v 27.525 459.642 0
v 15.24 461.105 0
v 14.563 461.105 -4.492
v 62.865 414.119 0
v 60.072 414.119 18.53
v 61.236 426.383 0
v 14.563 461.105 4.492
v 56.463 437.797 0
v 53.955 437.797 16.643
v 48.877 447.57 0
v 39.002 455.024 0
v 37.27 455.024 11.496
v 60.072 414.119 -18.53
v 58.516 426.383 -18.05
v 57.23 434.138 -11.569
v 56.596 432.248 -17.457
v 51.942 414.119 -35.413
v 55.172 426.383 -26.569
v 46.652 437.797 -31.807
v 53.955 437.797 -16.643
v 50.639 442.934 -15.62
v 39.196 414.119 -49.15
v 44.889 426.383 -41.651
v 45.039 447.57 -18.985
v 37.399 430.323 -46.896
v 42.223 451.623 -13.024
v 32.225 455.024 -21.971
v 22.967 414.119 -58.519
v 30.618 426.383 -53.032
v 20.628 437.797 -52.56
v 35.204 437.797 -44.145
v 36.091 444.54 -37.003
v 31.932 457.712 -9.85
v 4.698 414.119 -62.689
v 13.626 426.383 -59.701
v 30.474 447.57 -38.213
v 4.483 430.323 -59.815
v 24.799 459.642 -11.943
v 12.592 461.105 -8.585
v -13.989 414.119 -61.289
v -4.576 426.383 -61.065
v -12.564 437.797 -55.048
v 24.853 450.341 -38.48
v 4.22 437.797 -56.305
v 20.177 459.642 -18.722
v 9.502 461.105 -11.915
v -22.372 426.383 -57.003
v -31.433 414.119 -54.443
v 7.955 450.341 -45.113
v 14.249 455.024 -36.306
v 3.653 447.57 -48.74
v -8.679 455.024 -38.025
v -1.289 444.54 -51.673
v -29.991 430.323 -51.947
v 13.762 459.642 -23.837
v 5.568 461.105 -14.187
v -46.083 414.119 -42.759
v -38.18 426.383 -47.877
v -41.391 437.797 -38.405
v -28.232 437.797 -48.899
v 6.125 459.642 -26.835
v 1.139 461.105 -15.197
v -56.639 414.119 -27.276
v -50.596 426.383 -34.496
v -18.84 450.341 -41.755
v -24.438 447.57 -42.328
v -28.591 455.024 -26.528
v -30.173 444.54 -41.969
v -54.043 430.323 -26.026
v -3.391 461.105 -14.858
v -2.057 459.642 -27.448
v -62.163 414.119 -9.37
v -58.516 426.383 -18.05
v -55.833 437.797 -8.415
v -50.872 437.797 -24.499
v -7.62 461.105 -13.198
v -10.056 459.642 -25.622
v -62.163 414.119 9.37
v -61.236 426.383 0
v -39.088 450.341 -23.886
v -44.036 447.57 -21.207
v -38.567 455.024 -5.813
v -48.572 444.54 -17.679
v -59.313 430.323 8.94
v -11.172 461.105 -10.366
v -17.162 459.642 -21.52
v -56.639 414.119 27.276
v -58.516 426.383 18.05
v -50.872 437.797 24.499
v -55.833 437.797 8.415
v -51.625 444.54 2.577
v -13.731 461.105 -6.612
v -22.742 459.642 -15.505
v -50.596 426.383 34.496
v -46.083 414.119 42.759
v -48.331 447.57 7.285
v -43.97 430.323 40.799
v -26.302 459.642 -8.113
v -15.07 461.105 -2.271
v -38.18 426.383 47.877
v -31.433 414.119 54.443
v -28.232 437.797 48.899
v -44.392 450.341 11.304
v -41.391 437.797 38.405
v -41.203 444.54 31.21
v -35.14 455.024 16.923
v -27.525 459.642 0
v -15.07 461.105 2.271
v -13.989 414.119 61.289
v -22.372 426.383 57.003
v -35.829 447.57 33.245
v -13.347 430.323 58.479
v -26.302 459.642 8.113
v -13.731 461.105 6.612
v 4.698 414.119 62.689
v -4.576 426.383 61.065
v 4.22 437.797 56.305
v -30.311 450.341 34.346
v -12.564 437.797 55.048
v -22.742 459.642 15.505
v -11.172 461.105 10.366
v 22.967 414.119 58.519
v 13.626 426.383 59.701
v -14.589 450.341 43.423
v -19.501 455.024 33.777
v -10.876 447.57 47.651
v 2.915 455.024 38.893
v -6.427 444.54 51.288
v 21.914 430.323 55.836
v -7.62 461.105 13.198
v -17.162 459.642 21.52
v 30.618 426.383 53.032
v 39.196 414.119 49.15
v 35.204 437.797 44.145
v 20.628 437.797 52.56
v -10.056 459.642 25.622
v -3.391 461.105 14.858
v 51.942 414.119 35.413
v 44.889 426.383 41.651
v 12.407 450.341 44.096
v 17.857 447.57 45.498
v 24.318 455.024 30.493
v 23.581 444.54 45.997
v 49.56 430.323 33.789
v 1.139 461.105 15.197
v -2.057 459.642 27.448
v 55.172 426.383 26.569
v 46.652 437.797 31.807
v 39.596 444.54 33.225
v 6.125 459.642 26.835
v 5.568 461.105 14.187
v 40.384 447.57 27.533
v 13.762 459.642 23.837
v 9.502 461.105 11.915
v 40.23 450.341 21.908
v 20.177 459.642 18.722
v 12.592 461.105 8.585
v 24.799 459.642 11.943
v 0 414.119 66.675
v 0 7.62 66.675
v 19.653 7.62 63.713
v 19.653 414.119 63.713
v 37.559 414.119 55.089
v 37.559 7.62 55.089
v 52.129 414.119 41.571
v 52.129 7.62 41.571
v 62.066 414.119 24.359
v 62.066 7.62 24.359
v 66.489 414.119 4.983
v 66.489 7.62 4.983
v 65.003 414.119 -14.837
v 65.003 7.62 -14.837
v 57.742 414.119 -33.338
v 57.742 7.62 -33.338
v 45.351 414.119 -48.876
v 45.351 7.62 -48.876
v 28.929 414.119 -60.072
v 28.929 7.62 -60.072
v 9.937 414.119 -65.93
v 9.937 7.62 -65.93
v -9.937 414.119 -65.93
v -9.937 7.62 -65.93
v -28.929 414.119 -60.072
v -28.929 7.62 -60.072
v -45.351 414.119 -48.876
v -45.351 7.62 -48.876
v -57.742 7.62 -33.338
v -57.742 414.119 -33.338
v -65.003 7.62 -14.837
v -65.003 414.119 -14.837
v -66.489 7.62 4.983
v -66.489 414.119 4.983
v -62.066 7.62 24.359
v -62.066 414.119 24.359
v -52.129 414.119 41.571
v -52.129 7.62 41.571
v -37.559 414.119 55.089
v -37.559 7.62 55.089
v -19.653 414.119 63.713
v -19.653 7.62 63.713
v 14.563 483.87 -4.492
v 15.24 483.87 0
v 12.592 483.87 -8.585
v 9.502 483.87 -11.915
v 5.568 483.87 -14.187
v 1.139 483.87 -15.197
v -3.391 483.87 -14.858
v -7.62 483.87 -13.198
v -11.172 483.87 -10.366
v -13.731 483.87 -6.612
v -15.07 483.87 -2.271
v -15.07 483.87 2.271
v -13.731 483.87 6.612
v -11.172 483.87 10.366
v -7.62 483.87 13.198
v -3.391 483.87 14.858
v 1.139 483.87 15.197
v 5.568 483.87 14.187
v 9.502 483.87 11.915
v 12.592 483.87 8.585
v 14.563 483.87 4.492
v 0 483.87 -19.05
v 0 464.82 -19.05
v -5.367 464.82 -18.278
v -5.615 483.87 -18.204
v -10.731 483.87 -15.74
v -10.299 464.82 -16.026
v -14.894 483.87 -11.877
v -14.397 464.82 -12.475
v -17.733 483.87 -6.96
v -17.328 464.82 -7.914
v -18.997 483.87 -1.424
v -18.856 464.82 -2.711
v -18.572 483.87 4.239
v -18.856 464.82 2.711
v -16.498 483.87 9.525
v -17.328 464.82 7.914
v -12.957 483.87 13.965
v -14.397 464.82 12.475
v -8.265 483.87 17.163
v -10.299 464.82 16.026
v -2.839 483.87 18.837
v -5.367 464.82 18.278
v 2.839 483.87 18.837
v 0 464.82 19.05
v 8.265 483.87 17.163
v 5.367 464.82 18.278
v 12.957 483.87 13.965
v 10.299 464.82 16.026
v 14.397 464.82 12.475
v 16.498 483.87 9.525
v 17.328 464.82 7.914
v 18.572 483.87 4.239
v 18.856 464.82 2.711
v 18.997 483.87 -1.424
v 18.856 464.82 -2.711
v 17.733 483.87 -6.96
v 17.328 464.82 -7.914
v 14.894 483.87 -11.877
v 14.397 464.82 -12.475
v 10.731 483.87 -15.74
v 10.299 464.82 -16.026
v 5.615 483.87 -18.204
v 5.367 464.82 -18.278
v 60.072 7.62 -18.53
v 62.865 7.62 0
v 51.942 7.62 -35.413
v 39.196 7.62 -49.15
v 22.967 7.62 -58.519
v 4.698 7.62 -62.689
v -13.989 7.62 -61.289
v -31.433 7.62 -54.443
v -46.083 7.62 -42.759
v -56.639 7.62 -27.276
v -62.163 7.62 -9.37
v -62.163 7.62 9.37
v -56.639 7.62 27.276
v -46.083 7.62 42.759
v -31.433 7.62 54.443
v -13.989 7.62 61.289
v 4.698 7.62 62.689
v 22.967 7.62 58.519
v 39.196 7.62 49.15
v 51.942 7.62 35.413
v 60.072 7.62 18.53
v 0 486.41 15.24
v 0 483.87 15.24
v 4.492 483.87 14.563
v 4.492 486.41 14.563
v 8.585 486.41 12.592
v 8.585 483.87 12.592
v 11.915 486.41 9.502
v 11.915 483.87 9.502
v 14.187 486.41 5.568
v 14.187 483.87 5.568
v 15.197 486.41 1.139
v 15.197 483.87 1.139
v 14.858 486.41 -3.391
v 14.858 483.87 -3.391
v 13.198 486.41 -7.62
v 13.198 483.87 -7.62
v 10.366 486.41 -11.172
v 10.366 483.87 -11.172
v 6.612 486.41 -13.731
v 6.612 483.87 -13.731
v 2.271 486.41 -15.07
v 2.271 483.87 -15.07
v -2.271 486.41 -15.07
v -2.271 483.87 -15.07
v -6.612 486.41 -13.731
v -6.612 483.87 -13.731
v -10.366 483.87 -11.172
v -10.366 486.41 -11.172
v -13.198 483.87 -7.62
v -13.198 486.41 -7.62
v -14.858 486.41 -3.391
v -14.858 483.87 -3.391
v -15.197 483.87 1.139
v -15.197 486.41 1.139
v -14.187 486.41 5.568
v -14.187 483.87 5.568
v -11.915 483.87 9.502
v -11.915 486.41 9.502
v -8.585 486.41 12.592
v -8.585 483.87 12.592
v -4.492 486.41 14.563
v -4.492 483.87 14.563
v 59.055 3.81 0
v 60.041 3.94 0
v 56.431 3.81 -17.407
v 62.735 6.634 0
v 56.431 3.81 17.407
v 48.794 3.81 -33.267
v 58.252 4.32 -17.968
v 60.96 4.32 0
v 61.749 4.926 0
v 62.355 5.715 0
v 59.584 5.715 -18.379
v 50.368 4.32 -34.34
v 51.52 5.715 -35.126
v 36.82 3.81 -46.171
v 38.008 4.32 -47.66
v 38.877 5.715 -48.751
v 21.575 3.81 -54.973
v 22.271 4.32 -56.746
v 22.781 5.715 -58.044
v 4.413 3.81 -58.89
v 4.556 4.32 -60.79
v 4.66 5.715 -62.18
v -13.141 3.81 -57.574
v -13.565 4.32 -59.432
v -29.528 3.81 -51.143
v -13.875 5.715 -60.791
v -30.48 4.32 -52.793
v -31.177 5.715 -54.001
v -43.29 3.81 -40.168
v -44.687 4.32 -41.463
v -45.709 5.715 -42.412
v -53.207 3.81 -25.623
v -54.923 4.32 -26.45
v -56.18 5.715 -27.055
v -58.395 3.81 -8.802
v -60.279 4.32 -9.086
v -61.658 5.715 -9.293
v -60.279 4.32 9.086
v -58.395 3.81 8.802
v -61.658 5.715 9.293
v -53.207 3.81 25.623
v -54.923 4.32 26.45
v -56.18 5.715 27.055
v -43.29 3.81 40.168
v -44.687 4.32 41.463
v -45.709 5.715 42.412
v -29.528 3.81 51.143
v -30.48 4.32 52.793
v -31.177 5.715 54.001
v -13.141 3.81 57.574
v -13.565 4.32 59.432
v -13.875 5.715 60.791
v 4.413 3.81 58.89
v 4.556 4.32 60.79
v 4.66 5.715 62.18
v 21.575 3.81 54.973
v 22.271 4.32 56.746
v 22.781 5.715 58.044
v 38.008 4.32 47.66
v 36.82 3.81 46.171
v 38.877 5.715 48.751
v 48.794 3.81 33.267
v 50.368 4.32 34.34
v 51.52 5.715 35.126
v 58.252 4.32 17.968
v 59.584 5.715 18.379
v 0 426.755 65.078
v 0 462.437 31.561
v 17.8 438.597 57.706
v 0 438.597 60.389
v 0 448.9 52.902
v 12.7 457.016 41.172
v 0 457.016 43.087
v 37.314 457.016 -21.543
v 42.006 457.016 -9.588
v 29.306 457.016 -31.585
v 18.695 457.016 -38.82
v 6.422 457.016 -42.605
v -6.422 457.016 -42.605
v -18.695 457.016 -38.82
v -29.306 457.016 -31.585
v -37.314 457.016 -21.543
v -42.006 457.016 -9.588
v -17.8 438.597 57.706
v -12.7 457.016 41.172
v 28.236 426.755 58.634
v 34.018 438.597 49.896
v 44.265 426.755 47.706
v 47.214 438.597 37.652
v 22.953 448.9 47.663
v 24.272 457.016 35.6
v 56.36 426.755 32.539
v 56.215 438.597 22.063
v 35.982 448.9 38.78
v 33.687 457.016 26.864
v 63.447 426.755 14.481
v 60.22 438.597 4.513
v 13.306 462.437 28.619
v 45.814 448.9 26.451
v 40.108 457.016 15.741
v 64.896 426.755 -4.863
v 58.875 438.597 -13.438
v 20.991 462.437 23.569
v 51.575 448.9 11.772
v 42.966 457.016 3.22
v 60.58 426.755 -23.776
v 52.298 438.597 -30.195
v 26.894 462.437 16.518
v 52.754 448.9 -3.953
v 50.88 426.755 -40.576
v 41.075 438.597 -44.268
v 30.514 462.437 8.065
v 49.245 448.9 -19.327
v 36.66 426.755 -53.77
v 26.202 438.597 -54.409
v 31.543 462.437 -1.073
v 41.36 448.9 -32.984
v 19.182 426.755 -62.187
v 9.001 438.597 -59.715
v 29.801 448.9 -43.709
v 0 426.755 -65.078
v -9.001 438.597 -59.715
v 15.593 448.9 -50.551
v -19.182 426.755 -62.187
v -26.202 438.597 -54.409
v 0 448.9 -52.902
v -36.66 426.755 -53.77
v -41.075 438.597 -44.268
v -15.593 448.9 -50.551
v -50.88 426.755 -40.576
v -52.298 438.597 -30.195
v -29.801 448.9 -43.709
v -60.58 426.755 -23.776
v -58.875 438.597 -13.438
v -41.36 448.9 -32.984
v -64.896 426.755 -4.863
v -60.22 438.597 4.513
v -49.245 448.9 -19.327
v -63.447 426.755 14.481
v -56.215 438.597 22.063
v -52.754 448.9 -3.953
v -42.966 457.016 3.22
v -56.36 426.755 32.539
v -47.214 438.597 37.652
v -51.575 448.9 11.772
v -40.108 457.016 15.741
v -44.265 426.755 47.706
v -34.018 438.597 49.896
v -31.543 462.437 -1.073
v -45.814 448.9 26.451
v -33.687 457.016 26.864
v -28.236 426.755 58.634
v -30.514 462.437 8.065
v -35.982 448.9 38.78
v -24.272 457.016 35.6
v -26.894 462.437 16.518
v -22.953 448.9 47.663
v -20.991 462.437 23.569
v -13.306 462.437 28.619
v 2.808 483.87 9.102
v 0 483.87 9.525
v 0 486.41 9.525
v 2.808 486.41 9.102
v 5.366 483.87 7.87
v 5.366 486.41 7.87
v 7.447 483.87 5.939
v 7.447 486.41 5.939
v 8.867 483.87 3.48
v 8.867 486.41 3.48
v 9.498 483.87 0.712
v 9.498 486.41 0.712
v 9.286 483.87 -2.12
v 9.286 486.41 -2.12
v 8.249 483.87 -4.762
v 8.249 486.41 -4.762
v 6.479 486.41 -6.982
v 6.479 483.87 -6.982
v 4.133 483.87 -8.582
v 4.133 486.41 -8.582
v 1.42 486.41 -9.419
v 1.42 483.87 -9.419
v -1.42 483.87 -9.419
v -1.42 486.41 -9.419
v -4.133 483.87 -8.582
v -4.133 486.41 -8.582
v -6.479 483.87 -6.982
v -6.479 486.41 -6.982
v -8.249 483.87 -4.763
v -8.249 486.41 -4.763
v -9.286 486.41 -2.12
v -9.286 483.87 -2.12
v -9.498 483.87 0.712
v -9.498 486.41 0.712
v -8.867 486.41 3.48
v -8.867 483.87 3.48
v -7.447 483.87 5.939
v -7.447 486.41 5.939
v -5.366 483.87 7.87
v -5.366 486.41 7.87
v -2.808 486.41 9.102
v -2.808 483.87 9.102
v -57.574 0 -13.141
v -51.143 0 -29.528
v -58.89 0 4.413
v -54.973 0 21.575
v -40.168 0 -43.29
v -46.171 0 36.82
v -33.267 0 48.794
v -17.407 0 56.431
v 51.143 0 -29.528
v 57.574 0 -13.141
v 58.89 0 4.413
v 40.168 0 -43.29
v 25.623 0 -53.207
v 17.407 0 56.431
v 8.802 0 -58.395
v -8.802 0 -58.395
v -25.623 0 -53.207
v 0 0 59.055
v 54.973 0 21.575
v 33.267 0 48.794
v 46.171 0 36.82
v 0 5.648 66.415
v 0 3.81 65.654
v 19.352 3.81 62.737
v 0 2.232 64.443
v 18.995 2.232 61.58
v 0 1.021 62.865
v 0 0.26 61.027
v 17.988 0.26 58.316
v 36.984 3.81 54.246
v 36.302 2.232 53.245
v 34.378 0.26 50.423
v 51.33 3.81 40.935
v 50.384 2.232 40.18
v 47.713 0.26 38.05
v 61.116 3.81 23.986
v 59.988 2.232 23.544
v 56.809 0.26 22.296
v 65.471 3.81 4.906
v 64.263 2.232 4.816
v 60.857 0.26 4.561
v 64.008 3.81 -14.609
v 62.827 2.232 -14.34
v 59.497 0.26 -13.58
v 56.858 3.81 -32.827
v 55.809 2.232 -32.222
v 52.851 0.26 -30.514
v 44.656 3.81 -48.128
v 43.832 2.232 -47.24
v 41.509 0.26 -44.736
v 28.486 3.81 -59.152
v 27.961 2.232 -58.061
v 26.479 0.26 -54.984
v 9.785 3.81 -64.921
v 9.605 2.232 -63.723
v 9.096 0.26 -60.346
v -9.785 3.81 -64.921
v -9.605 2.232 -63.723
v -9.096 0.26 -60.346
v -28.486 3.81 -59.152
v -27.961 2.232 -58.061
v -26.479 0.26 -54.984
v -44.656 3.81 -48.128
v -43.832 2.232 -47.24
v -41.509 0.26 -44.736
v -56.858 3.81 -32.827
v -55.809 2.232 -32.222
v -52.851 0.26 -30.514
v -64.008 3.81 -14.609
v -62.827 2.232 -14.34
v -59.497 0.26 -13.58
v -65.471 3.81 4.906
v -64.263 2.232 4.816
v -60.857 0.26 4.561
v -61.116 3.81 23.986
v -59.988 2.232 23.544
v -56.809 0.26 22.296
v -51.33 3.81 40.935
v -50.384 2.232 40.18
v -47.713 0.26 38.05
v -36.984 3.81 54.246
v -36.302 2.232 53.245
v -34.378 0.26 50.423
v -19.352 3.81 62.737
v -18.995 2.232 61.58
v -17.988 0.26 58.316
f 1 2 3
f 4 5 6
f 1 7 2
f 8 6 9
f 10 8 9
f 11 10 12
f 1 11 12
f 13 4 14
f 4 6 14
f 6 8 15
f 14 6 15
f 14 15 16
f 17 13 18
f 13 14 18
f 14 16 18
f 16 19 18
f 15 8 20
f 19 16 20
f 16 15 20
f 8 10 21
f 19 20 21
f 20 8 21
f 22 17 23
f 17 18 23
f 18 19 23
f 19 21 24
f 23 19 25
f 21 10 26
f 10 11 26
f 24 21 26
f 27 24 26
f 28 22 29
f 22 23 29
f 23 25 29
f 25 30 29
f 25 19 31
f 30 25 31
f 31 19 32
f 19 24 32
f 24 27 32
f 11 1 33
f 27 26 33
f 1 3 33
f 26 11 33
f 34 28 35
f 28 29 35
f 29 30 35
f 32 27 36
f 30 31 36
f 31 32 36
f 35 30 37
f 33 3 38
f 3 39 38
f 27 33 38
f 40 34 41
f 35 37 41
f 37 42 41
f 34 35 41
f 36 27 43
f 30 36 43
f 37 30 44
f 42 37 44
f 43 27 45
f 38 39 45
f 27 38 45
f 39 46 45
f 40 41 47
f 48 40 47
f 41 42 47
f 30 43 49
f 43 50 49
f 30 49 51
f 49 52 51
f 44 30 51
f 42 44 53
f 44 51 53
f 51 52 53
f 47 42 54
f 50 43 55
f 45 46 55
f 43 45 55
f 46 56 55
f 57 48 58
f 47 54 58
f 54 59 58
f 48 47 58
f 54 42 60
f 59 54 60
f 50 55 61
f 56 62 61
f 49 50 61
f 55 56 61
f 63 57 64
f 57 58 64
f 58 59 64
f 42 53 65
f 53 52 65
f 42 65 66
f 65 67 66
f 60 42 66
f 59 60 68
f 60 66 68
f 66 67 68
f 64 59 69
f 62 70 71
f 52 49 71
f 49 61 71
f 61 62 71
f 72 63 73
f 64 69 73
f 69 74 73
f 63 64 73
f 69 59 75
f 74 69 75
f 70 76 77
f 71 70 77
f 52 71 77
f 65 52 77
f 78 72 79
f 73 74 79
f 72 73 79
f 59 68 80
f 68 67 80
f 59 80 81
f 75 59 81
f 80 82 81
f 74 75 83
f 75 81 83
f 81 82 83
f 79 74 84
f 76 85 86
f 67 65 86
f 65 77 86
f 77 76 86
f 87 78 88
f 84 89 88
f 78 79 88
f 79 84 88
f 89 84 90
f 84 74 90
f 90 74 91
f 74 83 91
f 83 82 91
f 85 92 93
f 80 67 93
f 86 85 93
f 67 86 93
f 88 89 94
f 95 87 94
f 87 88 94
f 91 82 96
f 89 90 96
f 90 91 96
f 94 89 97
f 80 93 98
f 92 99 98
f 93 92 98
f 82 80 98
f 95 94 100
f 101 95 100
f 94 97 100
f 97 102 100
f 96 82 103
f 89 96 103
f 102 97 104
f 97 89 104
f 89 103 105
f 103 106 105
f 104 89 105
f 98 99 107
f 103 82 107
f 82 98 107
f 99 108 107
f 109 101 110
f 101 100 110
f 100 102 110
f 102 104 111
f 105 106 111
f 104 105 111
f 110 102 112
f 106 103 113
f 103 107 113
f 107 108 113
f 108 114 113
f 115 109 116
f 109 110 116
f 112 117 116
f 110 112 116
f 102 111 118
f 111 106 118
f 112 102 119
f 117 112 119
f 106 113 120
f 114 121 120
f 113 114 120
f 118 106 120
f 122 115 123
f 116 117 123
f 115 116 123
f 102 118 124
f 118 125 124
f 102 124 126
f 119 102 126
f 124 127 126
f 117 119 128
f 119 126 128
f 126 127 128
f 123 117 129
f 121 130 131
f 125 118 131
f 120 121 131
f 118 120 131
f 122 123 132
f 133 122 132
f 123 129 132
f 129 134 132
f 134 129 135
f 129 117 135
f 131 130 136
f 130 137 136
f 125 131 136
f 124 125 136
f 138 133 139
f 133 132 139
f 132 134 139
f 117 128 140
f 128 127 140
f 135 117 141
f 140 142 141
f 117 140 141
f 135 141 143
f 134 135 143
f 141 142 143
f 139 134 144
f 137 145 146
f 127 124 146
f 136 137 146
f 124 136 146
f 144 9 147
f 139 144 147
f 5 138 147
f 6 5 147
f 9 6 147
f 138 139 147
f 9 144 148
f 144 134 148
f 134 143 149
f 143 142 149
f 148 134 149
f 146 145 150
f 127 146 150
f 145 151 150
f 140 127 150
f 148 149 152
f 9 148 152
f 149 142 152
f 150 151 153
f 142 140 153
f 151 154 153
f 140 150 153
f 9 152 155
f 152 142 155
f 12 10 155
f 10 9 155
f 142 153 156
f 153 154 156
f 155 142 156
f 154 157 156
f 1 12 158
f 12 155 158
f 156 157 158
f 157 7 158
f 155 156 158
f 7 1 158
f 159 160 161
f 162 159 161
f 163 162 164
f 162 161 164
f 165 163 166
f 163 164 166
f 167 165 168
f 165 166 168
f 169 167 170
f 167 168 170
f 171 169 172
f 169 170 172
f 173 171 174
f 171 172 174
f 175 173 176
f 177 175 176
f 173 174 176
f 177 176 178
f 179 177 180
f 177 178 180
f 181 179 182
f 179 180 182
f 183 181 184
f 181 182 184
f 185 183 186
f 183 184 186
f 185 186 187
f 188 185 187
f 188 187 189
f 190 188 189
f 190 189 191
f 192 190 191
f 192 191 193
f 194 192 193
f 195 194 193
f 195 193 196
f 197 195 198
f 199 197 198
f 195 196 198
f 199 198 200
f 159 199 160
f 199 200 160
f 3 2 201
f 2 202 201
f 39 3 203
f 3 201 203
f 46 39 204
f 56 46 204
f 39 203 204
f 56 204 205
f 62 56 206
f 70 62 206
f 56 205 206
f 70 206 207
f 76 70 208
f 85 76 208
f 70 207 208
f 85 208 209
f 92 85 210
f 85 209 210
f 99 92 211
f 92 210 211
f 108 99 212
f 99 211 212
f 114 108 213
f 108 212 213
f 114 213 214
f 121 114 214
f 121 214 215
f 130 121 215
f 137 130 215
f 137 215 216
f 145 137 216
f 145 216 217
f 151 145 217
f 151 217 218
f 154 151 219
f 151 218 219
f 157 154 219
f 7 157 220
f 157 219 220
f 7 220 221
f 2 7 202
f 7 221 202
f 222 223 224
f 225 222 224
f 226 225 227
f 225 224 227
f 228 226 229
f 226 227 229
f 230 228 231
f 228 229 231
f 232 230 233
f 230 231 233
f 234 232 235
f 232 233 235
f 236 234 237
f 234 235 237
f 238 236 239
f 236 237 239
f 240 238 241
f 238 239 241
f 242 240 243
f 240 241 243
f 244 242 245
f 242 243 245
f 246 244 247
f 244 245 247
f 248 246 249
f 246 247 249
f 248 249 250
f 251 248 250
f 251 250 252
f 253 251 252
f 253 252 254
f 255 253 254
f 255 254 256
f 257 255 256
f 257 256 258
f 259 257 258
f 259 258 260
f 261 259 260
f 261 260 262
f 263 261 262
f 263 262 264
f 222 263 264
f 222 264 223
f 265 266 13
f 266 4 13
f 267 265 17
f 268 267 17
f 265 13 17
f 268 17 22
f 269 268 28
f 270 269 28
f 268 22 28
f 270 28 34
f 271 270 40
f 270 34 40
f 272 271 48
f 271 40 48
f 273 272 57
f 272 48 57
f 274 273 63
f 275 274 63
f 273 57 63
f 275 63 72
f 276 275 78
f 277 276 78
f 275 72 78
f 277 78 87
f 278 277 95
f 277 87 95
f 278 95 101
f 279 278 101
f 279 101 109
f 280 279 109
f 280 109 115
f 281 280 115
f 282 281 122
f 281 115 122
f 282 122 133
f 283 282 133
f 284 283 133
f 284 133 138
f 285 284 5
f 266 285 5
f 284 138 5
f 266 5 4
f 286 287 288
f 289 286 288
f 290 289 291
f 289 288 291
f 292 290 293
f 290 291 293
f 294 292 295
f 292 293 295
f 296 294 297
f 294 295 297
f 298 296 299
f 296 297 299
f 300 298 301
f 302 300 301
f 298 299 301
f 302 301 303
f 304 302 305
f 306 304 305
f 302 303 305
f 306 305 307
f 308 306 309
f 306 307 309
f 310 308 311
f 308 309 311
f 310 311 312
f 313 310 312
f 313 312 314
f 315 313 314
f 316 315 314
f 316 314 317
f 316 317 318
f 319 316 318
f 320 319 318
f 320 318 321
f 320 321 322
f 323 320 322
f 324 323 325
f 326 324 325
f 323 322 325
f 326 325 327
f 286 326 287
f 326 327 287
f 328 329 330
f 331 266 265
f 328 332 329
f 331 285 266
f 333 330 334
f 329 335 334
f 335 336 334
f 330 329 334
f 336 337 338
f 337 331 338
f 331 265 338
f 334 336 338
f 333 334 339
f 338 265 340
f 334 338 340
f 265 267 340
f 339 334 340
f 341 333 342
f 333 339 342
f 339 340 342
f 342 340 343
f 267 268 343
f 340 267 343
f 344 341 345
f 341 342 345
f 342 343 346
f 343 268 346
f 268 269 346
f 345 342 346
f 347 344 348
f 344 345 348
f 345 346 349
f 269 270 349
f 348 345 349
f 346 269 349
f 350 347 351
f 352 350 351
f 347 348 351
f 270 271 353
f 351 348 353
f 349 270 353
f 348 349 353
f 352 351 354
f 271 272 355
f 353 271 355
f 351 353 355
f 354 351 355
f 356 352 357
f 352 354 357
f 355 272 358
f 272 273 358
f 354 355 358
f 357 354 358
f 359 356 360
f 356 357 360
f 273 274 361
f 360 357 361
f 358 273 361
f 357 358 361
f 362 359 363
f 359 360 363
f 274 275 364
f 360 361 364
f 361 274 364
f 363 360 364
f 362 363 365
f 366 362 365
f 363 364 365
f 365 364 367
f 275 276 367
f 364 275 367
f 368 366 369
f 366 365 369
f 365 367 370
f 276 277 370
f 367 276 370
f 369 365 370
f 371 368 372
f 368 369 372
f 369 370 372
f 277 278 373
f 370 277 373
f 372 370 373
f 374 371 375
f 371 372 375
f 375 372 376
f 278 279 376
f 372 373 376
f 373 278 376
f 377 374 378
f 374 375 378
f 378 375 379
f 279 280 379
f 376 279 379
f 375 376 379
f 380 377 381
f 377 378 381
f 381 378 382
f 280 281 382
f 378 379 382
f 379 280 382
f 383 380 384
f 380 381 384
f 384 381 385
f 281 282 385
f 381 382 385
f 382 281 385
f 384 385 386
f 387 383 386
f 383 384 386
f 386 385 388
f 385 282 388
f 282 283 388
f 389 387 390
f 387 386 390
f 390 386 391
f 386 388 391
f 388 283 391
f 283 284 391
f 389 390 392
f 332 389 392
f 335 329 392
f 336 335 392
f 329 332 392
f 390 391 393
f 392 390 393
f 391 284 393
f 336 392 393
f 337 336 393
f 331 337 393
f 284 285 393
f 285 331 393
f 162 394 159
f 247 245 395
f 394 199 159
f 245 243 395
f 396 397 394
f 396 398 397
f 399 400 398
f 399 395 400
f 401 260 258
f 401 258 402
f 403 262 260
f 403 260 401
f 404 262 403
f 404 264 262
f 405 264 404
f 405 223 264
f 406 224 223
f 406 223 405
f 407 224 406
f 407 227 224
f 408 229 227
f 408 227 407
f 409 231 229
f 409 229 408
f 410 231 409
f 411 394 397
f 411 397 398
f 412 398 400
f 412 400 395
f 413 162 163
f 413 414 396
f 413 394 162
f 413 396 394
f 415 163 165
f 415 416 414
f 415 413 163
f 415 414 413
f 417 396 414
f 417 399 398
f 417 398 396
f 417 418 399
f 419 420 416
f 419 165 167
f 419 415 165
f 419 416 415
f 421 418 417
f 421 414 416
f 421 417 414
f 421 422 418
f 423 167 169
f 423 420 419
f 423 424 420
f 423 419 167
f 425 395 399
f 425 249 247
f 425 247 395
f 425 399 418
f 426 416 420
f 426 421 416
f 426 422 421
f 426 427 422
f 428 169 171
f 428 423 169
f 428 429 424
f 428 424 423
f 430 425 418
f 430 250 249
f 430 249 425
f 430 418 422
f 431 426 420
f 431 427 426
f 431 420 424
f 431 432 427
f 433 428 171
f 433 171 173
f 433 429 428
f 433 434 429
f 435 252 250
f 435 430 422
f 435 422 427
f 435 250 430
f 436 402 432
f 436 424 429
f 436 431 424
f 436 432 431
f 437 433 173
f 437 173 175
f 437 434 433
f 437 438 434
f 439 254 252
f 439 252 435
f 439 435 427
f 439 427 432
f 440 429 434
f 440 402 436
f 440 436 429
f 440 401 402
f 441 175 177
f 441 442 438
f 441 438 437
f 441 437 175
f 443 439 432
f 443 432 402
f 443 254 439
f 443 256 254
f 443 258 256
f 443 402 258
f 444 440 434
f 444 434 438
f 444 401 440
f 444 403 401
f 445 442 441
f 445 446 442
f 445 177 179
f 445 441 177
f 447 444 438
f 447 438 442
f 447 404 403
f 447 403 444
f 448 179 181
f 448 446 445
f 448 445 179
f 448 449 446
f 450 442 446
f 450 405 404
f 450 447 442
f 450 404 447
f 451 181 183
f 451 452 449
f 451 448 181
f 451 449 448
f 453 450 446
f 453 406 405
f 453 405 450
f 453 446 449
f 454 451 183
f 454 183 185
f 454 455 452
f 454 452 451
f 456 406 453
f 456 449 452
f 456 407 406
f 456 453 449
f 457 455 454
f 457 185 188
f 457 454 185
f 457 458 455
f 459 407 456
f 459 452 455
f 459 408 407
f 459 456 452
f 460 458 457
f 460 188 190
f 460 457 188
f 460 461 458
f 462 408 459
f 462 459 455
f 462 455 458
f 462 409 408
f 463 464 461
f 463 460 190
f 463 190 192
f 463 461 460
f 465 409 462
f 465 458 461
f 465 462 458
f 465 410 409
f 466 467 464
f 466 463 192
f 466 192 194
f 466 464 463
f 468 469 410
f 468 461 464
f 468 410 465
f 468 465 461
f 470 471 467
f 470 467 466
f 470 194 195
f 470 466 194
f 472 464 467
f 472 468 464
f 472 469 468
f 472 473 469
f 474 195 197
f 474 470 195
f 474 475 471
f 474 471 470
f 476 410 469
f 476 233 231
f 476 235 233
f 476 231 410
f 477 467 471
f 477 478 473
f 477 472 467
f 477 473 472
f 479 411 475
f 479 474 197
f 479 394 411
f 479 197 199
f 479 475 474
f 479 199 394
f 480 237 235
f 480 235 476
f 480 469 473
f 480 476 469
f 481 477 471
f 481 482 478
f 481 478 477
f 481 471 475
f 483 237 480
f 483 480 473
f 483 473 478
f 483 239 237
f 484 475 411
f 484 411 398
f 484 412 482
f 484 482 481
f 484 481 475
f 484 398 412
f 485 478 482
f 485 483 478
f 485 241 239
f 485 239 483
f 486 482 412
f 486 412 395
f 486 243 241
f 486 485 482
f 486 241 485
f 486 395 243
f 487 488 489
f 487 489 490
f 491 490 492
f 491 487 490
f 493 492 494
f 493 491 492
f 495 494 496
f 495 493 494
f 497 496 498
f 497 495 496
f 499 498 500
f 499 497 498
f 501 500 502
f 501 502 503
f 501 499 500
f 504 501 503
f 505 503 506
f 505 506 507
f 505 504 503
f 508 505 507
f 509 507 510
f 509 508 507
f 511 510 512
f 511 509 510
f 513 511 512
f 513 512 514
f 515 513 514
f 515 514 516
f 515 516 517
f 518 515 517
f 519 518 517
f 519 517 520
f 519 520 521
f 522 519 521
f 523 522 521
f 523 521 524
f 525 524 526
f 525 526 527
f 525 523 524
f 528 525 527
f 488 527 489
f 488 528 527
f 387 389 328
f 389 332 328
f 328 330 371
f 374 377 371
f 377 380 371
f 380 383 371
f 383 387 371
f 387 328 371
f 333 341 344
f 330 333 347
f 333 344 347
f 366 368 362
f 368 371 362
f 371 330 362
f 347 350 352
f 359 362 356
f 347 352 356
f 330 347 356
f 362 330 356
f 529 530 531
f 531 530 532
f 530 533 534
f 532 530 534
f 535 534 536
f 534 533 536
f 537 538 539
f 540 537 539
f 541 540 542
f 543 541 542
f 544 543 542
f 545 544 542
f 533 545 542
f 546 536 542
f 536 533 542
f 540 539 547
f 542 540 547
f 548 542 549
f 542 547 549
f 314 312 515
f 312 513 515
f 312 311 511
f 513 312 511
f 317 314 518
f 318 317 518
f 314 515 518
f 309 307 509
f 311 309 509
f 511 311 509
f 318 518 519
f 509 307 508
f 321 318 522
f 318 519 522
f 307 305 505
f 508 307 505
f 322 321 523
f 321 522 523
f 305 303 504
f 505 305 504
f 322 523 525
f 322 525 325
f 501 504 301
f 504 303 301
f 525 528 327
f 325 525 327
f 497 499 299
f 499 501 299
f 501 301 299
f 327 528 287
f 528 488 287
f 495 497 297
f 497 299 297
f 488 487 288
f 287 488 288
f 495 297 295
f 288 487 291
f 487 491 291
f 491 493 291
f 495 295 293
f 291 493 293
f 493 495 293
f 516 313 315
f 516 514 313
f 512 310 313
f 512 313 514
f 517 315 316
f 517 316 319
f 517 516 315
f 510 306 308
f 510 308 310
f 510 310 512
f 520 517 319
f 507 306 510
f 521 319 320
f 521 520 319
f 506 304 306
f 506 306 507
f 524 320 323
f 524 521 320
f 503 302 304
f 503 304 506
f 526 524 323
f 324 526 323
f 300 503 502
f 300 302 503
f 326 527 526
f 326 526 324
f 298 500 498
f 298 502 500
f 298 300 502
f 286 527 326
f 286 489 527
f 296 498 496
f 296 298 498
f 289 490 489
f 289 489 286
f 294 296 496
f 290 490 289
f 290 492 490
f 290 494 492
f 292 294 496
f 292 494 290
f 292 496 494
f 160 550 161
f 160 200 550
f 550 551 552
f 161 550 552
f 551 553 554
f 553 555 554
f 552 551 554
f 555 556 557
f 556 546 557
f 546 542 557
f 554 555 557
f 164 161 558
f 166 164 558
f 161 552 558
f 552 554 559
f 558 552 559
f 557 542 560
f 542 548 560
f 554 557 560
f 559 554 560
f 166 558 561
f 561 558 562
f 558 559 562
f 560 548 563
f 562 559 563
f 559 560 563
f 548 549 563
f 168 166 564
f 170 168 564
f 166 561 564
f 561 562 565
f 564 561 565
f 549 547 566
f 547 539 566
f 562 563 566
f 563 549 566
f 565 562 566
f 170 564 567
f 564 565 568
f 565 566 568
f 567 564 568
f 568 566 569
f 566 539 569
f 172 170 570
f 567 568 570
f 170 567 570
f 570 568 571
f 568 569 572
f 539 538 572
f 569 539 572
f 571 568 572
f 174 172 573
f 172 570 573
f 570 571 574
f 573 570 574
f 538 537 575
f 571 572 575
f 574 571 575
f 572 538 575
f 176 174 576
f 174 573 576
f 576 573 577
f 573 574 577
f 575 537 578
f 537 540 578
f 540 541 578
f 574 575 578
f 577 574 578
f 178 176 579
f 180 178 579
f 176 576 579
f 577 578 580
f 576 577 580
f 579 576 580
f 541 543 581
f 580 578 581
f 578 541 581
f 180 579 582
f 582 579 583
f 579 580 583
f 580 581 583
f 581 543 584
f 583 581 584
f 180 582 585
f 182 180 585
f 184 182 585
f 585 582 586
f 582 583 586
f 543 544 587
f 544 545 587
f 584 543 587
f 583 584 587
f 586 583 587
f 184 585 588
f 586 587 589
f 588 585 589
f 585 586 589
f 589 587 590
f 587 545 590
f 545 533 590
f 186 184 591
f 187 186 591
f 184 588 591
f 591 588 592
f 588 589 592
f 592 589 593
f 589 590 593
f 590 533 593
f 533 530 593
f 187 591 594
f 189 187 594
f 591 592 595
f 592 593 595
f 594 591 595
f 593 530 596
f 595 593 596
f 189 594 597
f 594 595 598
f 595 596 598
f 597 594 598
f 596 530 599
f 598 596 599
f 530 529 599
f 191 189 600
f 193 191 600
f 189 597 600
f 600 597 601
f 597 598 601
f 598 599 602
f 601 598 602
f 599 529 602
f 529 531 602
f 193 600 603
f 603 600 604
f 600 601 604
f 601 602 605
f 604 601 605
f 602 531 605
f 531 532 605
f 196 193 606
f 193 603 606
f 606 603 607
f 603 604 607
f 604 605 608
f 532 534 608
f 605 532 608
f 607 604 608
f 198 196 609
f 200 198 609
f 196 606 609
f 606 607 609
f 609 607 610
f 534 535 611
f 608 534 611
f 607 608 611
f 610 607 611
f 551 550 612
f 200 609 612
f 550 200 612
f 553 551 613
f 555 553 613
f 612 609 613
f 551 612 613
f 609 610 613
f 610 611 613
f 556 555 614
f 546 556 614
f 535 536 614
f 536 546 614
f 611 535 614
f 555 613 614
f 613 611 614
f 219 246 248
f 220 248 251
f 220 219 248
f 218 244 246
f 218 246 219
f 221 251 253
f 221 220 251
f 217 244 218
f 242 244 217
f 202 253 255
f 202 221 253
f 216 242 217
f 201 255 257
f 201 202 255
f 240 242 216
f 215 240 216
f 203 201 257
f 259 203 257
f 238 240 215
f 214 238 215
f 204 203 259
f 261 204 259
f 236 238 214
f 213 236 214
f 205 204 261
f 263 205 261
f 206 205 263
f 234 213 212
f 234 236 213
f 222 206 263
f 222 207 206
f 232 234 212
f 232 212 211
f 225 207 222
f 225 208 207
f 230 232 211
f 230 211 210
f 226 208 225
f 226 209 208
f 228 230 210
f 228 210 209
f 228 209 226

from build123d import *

# Parameters (mm, degrees)
SKETCH1_R           = 66.675
BOSS_EXTRUDE1_DEPTH = 414.02
SKETCH2_R           = 66.675
BOSS_EXTRUDE2_DEPTH = 50.8
SKETCH3_R           = 19.05
BOSS_EXTRUDE3_DEPTH = 19.05
FILLET1_R           = 50.8
FILLET2_R           = 7.62
SKETCH4_R           = 15.24
SKETCH4_R_2         = 9.525
BOSS_EXTRUDE4_DEPTH = 2.54


# Read off the part's stored shape, not the designer's step: Shell2
with BuildPart() as part:
    # Sketch1 → Boss-Extrude1 (new body)
    with BuildSketch(Plane(origin=(0, 0, 0), x_dir=(1, 0, 0), z_dir=(0, 1, 0))):
        with Locations(Location((0, 0, 0), (0, 0, 270))):
            Circle(SKETCH1_R)
    extrude(amount=BOSS_EXTRUDE1_DEPTH)

    # Sketch2 → Boss-Extrude2 (add)
    with BuildSketch(Plane(origin=(0, 414.02, 0), x_dir=(1, 0, 0), z_dir=(0, 1, 0))):
        with Locations(Location((0, 0, 0), (0, 0, 270))):
            Circle(SKETCH2_R)
    extrude(amount=BOSS_EXTRUDE2_DEPTH)

    # Sketch3 → Boss-Extrude3 (add)
    with BuildSketch(Plane(origin=(0, 464.82, 0), x_dir=(1, 0, 0), z_dir=(0, 1, 0))):
        with Locations(Location((0, 0, 0), (0, 0, 90))):
            Circle(SKETCH3_R)
    extrude(amount=BOSS_EXTRUDE3_DEPTH)

    # Fillet1
    # the kernel refuses this fillet: 50.8 mm, written as the material it takes off along each edge
    with BuildSketch(Plane(origin=(0, 464.82, 0), x_dir=(0, 0, 1), z_dir=(-1, 0, 0))) as fillet1_piece_1:
        with BuildLine():
            CenterArc((15.875, -50.700684167), FILLET1_R, 0, 86.416678302)
            Line((19.05, 0), (19.1135, 1.014013683))
            ThreePointArc((19.1135, 1.014013683), (42.8625, 1.016), (66.675, 1.016))
            Line((66.675, 1.016), (67.691, 0))
            Line((67.691, 0), (67.691, -50.700684167))
            Line((67.691, -50.700684167), (66.675, -50.700684167))
        make_face()
    revolve(axis=Axis((0, 464.82, 0), (0, 1, 0)), mode=Mode.SUBTRACT)

    # Fillet2
    fillet2_edges = [part.edges().sort_by_distance(p)[0] for p in [
        (0, 0, -66.675),
    ]]
    fillet(fillet2_edges, radius=FILLET2_R)

    # Shell2 outline → Shell2 (revolve, cut)
    with BuildSketch(Plane.XY):
        with BuildLine():
            Line((62.865, 7.62), (62.865, 414.119315833))
            ThreePointArc((62.865, 414.119315833), (48.876677609, 447.570016498), (15.24, 461.105025097))
            Line((15.24, 461.105025097), (15.24, 483.87))
            Line((15.24, 483.87), (0, 483.87))
            Line((0, 483.87), (0, 3.81))
            Line((0, 3.81), (59.055, 3.81))
            ThreePointArc((59.055, 3.81), (61.749076836, 4.925923164), (62.865, 7.62))
        make_face()
    revolve(axis=Axis((0, 0, 0), (0, 1, 0)), mode=Mode.SUBTRACT)


with BuildPart() as body_2:
    # Sketch4 → Boss-Extrude4 (new body)
    with BuildSketch(Plane(origin=(0, 483.87, 0), x_dir=(1, 0, 0), z_dir=(0, 1, 0))):
        with Locations(Location((0, 0, 0), (0, 0, 270))):
            Circle(SKETCH4_R)
        with Locations(Location((0, 0, 0), (0, 0, 270))):
            Circle(SKETCH4_R_2, mode=Mode.SUBTRACT)
    extrude(amount=BOSS_EXTRUDE4_DEPTH)


solid = Compound([part.part, body_2.part])
